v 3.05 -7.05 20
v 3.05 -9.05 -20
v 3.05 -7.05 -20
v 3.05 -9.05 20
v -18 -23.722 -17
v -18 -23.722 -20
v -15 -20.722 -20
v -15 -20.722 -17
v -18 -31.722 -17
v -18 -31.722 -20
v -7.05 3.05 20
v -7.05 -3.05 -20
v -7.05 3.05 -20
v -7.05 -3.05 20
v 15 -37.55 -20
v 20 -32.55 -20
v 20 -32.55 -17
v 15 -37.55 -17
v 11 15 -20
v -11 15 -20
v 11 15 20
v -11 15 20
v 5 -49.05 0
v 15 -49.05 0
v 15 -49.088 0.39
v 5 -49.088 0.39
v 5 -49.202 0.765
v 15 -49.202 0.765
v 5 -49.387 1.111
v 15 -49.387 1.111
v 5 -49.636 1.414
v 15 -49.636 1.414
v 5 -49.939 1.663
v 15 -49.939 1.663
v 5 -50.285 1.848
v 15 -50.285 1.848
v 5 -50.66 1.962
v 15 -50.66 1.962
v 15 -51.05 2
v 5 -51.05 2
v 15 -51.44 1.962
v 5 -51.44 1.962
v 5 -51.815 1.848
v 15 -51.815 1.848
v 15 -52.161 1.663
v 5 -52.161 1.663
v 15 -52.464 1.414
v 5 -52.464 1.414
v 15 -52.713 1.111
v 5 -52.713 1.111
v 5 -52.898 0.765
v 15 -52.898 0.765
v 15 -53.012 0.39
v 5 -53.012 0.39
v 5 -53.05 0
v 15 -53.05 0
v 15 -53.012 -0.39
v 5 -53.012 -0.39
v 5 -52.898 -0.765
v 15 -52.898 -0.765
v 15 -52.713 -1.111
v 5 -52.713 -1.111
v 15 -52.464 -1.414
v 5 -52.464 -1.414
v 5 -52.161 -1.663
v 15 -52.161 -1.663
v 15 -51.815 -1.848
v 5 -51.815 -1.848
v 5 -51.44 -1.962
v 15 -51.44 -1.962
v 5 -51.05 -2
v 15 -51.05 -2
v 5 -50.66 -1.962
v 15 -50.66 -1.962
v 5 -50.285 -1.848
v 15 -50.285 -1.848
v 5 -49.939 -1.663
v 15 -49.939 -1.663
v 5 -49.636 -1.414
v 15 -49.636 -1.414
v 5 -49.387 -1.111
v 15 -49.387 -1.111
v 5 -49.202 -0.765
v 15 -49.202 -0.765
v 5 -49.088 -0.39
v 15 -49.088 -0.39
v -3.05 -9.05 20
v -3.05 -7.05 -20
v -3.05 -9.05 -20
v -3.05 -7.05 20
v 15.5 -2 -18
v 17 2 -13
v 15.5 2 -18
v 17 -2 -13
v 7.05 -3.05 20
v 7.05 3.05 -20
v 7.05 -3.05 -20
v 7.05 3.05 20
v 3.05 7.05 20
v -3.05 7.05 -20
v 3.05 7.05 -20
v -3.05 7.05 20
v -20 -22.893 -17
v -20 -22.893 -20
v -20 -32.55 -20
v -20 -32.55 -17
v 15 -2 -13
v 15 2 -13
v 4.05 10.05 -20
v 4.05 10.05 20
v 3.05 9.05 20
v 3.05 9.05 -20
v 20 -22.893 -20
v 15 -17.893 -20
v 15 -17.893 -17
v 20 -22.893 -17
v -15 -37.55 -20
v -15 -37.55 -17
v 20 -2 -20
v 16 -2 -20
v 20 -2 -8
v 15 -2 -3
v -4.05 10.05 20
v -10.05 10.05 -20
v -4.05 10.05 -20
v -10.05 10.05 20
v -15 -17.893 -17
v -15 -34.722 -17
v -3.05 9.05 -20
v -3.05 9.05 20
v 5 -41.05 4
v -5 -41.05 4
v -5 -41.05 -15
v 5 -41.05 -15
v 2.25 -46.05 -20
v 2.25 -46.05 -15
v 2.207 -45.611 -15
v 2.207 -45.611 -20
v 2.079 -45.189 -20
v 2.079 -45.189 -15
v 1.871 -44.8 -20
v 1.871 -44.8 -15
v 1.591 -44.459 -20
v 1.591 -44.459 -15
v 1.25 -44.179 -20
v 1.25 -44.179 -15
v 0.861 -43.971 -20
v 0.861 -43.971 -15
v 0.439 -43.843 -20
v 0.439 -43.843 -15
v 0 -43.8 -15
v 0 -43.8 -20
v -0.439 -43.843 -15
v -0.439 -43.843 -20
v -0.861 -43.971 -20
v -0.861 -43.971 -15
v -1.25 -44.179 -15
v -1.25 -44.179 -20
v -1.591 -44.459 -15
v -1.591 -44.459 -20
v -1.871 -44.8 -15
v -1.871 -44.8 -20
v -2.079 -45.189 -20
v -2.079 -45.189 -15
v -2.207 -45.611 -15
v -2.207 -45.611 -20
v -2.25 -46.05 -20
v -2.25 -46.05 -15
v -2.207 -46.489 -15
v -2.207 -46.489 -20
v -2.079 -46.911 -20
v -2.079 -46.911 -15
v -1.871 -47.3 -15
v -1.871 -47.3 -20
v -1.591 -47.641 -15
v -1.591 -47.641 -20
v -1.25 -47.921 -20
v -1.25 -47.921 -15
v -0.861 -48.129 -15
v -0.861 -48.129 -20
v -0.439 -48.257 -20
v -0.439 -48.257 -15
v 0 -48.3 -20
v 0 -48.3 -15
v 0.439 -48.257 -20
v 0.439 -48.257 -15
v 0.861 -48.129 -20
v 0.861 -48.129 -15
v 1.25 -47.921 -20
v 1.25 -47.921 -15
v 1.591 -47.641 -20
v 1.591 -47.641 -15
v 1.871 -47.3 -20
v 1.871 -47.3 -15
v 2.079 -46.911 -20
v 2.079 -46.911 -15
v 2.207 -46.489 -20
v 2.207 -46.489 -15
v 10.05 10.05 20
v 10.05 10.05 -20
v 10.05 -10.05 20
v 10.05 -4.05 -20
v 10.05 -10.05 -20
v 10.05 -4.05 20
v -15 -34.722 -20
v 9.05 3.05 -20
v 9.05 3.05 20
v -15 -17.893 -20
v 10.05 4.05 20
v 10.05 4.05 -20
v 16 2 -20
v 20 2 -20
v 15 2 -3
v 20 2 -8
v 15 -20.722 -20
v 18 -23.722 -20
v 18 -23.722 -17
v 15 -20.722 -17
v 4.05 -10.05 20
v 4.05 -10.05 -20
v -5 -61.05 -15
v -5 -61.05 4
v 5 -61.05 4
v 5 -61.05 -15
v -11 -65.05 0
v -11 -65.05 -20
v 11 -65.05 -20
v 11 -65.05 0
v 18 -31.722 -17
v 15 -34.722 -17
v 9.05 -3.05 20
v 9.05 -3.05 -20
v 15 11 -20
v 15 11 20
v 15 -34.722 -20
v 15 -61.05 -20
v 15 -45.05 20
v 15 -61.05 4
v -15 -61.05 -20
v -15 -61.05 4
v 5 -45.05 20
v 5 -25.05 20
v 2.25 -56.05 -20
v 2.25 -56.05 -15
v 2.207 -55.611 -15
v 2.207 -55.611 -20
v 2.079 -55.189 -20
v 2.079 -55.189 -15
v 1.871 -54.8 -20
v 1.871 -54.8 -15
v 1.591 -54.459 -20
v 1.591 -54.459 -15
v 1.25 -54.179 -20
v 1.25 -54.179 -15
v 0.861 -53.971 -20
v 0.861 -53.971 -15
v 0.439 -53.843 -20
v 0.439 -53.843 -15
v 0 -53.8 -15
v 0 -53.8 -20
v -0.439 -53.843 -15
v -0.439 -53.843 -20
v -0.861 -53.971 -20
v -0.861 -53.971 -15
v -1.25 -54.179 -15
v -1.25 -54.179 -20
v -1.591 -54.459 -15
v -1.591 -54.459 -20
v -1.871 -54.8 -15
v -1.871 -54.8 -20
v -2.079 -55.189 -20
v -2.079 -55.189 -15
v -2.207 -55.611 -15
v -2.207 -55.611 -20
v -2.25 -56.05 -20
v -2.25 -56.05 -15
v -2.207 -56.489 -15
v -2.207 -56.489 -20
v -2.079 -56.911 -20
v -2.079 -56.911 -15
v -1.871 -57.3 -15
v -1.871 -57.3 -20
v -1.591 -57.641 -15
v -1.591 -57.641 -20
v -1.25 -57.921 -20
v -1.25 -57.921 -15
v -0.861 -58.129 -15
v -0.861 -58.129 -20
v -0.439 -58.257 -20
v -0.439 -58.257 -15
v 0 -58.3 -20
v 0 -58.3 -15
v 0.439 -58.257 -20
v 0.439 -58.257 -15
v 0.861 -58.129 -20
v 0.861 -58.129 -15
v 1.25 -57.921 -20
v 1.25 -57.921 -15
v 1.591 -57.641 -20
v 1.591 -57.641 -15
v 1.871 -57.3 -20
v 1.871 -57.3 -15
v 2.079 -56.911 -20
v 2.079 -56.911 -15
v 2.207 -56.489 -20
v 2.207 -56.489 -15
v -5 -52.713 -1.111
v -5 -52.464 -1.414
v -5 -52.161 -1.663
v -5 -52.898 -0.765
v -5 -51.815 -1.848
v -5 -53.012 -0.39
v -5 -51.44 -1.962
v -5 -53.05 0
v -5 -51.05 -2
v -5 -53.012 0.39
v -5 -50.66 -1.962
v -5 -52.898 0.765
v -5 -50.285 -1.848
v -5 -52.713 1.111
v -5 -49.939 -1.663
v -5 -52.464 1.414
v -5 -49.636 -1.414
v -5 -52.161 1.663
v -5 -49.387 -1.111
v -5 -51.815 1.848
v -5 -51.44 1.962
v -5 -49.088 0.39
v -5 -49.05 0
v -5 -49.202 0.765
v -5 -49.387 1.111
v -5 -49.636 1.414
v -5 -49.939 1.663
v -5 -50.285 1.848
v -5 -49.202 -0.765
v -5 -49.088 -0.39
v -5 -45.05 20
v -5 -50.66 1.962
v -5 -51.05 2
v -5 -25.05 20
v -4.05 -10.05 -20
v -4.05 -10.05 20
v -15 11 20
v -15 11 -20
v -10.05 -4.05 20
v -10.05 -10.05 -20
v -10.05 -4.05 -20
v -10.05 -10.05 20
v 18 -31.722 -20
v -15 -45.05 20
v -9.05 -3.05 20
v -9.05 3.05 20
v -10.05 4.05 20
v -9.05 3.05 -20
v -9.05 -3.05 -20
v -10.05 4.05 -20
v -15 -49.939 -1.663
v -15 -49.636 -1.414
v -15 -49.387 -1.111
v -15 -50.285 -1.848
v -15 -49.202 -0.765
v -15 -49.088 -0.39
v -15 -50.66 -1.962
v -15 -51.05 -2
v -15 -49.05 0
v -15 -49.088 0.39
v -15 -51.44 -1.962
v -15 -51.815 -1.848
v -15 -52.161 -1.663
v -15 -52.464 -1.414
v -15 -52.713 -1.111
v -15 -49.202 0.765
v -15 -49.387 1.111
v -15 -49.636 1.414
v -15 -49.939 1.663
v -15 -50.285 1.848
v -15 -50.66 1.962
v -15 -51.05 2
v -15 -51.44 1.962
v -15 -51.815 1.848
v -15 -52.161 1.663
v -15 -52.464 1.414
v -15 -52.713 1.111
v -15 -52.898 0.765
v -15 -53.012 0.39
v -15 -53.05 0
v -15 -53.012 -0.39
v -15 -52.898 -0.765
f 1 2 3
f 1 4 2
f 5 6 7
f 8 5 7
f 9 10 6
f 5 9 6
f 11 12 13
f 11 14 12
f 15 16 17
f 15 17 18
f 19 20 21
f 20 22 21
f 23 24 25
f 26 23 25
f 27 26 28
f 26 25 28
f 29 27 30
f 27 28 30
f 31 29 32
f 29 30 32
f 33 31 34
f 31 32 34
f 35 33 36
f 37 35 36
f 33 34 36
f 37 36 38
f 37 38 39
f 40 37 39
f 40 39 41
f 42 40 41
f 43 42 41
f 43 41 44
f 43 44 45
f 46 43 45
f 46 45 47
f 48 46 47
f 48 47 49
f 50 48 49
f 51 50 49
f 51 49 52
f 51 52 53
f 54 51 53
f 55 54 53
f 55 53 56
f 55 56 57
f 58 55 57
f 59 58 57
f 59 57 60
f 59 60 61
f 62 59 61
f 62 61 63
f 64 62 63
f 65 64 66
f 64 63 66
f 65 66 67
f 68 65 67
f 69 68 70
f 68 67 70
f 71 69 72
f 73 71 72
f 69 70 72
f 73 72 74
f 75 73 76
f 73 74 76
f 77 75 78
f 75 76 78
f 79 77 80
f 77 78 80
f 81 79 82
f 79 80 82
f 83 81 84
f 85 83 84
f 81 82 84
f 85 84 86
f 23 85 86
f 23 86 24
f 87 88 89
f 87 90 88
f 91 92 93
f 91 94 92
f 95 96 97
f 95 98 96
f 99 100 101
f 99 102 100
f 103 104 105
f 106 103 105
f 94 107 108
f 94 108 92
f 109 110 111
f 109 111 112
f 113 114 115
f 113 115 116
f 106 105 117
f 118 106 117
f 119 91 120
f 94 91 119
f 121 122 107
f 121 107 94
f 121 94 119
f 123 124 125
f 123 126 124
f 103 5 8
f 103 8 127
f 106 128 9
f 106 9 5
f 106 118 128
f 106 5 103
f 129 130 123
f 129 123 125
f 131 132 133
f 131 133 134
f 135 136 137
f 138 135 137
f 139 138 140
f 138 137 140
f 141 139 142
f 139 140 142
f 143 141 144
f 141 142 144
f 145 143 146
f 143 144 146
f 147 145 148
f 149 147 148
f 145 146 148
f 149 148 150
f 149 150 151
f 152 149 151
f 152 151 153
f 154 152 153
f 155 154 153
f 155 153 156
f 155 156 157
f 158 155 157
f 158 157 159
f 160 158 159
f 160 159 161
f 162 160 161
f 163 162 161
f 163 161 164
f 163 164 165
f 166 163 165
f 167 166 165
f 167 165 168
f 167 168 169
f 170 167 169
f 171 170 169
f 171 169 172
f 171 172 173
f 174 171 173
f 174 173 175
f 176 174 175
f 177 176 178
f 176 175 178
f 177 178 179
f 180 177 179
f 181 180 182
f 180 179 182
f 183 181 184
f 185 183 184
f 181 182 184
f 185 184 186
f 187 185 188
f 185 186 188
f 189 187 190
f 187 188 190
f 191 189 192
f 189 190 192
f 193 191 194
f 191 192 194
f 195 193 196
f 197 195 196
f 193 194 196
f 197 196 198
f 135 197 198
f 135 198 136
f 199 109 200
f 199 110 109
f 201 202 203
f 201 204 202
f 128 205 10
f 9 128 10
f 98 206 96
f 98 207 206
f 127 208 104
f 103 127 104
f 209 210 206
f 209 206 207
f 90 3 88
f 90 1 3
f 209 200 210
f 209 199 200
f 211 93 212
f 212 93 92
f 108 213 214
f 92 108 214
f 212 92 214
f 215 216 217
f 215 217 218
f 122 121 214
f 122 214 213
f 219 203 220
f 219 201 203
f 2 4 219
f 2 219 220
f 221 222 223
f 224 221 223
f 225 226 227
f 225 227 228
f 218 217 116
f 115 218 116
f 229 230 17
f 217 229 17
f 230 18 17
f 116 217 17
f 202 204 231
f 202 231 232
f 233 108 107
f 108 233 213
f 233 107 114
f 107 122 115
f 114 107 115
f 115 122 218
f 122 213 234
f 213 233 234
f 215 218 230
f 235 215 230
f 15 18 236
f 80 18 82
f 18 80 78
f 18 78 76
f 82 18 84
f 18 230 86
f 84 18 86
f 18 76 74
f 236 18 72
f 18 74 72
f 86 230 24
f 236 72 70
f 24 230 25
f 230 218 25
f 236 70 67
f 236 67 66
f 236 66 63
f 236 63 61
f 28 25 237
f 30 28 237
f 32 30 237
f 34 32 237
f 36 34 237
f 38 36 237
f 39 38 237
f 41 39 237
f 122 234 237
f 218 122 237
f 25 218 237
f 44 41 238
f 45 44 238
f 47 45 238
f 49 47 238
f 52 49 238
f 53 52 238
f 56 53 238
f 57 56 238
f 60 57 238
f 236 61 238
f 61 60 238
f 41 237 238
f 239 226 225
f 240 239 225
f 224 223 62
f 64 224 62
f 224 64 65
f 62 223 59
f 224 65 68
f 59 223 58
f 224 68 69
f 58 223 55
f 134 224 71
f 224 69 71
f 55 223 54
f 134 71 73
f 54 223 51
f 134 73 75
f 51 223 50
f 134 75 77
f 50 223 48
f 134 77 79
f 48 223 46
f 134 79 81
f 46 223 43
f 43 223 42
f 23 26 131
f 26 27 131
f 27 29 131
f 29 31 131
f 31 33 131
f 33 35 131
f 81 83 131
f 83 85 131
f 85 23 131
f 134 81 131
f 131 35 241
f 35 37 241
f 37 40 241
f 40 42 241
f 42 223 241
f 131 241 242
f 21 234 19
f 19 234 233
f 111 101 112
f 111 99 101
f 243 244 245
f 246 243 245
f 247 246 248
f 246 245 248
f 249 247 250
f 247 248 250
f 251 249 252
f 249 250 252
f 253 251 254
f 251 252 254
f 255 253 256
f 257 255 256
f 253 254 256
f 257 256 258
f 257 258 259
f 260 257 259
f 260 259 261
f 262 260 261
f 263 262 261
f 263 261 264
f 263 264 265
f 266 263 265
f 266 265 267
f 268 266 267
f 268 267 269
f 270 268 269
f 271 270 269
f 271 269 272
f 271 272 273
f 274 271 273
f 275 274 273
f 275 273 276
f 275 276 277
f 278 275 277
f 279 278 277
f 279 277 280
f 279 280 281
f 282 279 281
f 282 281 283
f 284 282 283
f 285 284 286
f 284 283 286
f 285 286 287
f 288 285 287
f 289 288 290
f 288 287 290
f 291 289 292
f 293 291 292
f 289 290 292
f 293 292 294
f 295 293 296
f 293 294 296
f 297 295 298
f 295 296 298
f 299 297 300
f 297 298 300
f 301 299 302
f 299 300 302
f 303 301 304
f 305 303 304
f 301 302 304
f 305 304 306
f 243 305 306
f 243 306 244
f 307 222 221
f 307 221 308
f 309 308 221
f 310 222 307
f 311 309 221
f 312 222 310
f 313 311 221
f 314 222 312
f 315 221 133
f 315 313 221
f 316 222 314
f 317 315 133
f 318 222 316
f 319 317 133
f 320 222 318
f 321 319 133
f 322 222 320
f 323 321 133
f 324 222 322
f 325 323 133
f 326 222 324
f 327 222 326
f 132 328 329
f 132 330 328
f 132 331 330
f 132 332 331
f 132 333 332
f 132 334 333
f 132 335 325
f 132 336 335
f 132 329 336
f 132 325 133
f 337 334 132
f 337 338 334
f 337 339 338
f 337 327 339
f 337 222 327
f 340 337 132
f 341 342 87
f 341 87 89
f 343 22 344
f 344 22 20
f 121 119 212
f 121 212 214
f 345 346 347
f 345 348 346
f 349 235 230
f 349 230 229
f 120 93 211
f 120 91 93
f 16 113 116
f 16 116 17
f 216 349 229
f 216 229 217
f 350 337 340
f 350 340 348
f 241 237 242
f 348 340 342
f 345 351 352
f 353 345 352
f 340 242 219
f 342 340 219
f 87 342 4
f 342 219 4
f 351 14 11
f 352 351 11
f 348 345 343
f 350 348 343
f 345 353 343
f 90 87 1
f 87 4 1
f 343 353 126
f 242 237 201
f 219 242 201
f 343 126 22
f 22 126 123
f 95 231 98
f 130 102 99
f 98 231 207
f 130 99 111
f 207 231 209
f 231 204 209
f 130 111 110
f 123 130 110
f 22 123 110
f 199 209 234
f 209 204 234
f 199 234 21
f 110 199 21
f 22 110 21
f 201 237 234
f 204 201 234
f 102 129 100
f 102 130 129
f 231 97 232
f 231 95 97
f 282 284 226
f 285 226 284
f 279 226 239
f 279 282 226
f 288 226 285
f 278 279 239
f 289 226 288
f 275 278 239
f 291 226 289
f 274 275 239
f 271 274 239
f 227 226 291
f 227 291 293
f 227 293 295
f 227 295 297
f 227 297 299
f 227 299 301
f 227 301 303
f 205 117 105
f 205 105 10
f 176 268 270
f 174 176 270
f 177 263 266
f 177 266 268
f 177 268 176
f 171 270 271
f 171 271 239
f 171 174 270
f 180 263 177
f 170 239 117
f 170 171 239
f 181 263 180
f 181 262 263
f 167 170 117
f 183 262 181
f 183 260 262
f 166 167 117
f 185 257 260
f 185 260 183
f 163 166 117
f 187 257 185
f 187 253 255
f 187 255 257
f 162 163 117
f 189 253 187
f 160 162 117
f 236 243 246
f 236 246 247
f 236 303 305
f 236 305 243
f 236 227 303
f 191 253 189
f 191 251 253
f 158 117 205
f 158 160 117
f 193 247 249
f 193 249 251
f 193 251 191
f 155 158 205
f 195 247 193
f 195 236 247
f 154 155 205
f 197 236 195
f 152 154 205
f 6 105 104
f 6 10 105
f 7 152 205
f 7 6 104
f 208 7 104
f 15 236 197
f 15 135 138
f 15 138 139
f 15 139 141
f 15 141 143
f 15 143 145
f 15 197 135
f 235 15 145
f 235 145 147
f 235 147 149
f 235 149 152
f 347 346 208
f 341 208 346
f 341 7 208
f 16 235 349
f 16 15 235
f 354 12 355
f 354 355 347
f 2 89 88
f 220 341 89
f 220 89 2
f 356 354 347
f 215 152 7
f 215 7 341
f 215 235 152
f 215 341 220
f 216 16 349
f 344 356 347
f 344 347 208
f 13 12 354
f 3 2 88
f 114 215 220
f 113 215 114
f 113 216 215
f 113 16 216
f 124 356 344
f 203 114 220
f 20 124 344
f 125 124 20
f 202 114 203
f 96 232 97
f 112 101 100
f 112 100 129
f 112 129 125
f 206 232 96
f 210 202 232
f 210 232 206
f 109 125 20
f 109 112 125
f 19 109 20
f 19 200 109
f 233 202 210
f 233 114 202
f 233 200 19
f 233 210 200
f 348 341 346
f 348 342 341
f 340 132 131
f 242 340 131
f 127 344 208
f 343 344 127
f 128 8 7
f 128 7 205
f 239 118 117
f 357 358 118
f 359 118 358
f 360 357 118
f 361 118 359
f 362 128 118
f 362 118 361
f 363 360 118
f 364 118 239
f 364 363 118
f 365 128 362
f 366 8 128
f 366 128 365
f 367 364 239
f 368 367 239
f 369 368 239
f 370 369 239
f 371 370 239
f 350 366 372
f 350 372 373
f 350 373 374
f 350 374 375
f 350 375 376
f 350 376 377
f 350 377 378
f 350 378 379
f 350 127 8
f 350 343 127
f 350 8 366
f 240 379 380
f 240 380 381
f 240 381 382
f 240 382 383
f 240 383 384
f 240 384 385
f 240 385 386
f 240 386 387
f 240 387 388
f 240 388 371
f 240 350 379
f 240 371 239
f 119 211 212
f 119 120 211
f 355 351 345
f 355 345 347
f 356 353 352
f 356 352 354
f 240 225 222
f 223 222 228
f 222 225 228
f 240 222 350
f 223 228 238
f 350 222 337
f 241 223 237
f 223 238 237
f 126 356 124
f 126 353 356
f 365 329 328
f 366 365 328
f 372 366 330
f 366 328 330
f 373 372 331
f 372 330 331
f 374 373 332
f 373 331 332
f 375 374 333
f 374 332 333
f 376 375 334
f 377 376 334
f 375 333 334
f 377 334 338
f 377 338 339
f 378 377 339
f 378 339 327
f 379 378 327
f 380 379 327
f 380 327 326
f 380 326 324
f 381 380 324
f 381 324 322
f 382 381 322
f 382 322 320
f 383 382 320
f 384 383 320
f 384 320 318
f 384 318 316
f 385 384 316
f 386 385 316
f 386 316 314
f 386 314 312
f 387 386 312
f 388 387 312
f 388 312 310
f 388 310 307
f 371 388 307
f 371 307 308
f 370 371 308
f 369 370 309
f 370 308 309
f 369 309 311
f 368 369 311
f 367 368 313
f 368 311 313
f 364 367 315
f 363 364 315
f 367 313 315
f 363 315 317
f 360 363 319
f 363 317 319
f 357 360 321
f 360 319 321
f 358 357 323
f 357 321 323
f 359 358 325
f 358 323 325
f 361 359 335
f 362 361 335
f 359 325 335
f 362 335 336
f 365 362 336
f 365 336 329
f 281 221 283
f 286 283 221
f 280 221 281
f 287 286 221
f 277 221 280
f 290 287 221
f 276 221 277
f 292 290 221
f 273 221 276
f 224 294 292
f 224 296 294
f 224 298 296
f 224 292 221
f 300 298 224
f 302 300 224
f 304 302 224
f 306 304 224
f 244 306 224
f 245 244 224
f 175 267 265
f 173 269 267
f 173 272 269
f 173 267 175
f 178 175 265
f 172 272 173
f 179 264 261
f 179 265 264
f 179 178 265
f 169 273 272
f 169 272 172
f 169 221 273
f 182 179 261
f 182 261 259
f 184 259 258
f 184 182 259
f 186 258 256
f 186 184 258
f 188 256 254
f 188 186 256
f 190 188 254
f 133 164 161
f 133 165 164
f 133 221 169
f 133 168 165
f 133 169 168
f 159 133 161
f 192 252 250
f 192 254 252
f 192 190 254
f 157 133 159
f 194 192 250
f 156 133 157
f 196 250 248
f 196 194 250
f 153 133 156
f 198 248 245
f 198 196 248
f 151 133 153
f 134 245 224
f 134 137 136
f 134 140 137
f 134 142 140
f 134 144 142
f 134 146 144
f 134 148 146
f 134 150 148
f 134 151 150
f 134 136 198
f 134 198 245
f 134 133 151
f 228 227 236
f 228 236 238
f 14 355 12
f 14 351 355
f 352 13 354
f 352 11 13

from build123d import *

# Parameters (mm, degrees)
SKETCH002_W     = 30
SKETCH002_H     = 30
PAD002_DEPTH    = 20
CHAMFER_SIZE    = 1
PAD003_DEPTH    = 15
SKETCH004_W     = 10
SKETCH004_H     = 20
POCKET_DEPTH    = 35
CHAMFER001_SIZE = 16
SKETCH005_R     = 2.25
POCKET001_DEPTH = 5.001
PAD004_DEPTH    = 2
CHAMFER002_SIZE = 4
SKETCH017_R     = 2
POCKET004_DEPTH = 30.001
PAD011_DEPTH    = 3


with BuildPart() as part:
    # Sketch002 → Pad002 (new body, symmetric)
    with BuildSketch(Plane.XY):
        Rectangle(SKETCH002_W, SKETCH002_H)
        Polygon((10.05, 3.05), (7.05, 3.05), (7.05, -3.05), (10.05, -3.05), (10.05, -10.05), (3.05, -10.05), (3.05, -7.05), (-3.05, -7.05), (-3.05, -10.05), (-10.05, -10.05), (-10.05, -3.05), (-7.05, -3.05), (-7.05, 3.05), (-10.05, 3.05), (-10.05, 10.05), (-3.05, 10.05), (-3.05, 7.05), (3.05, 7.05), (3.05, 10.05), (10.05, 10.05), align=None, mode=Mode.SUBTRACT)
    extrude(amount=PAD002_DEPTH, both=True)

    # Chamfer
    chamfer_edges = [part.edges().sort_by_distance(p)[0] for p in [
        (-10.05, 3.05, 0),
        (-3.05, 10.05, 0),
        (-10.05, -3.05, 0),
        (-3.05, -10.05, 0),
        (3.05, -10.05, 0),
        (10.05, -3.05, 0),
        (10.05, 3.05, 0),
        (3.05, 10.05, 0),
    ]]
    chamfer(chamfer_edges, length=CHAMFER_SIZE)

    # Sketch003 → Pad003 (join, symmetric)
    with BuildSketch(Plane.YZ):
        Polygon((-15, -20), (-40.05, -20), (-65.05, -20), (-65.05, 0), (-45.05, 20), (-15, 20), align=None)
    extrude(amount=PAD003_DEPTH, both=True)

    # Sketch004 (on Face35 of Pad003) → Pocket (cut)
    with BuildSketch(Plane.XY.offset(20)):
        with Locations((0, -51.05)):
            Rectangle(SKETCH004_W, SKETCH004_H)
    extrude(amount=-POCKET_DEPTH, mode=Mode.SUBTRACT)

    # Chamfer001
    chamfer001_edges = [part.edges().sort_by_distance(p)[0] for p in [
        (0, -41.05, 20),
    ]]
    chamfer(chamfer001_edges, length=CHAMFER001_SIZE)

    # Sketch005 (on Face10 of Chamfer001) → Pocket001 (cut, through all)
    with BuildSketch(Plane.XY.offset(-15)):
        with Locations((0, -46.05)):
            Circle(SKETCH005_R)
        with Locations((0, -56.05)):
            Circle(SKETCH005_R)
    extrude(amount=-POCKET001_DEPTH, mode=Mode.SUBTRACT)

    # Sketch006 → Pad004 (join, symmetric)
    with BuildSketch(Plane.XZ):
        Polygon((16, -20), (20, -20), (20, -8), (15, -3), (15, -13), (17, -13), (15.5, -18), align=None)
    extrude(amount=PAD004_DEPTH, both=True)

    # Chamfer002
    chamfer002_edges = [part.edges().sort_by_distance(p)[0] for p in [
        (-15, -65.05, -10),
        (15, -65.05, -10),
        (-15, 15, 0),
        (15, 15, 0),
    ]]
    chamfer(chamfer002_edges, length=CHAMFER002_SIZE)

    # Sketch017 (on Face9 of Chamfer002) → Pocket004 (cut, through all)
    with BuildSketch(Plane.YZ.offset(15)):
        with Locations((-51.05, 0)):
            Circle(SKETCH017_R)
    extrude(amount=-POCKET004_DEPTH, mode=Mode.SUBTRACT)

    # Sketch019 (on Face12 of Pocket004) → Pad011 (join)
    with BuildSketch(Plane(origin=(0, 0, -20), x_dir=(1, 0, 0), z_dir=(0, 0, -1))):
        Polygon((15, 34.721573), (18, 31.721573), (18, 23.721573), (15, 20.721573), (15, 17.893146), (20, 22.893146), (20, 32.55), (15, 37.55), align=None)
    pad011 = extrude(amount=-PAD011_DEPTH)

    # Mirrored001: Pad011 across Sketch019 V_Axis
    add(pad011.mirror(Plane(origin=(0, 0, -20), x_dir=(0, 0, -1), z_dir=(1, 0, 0))))


solid = part.part
